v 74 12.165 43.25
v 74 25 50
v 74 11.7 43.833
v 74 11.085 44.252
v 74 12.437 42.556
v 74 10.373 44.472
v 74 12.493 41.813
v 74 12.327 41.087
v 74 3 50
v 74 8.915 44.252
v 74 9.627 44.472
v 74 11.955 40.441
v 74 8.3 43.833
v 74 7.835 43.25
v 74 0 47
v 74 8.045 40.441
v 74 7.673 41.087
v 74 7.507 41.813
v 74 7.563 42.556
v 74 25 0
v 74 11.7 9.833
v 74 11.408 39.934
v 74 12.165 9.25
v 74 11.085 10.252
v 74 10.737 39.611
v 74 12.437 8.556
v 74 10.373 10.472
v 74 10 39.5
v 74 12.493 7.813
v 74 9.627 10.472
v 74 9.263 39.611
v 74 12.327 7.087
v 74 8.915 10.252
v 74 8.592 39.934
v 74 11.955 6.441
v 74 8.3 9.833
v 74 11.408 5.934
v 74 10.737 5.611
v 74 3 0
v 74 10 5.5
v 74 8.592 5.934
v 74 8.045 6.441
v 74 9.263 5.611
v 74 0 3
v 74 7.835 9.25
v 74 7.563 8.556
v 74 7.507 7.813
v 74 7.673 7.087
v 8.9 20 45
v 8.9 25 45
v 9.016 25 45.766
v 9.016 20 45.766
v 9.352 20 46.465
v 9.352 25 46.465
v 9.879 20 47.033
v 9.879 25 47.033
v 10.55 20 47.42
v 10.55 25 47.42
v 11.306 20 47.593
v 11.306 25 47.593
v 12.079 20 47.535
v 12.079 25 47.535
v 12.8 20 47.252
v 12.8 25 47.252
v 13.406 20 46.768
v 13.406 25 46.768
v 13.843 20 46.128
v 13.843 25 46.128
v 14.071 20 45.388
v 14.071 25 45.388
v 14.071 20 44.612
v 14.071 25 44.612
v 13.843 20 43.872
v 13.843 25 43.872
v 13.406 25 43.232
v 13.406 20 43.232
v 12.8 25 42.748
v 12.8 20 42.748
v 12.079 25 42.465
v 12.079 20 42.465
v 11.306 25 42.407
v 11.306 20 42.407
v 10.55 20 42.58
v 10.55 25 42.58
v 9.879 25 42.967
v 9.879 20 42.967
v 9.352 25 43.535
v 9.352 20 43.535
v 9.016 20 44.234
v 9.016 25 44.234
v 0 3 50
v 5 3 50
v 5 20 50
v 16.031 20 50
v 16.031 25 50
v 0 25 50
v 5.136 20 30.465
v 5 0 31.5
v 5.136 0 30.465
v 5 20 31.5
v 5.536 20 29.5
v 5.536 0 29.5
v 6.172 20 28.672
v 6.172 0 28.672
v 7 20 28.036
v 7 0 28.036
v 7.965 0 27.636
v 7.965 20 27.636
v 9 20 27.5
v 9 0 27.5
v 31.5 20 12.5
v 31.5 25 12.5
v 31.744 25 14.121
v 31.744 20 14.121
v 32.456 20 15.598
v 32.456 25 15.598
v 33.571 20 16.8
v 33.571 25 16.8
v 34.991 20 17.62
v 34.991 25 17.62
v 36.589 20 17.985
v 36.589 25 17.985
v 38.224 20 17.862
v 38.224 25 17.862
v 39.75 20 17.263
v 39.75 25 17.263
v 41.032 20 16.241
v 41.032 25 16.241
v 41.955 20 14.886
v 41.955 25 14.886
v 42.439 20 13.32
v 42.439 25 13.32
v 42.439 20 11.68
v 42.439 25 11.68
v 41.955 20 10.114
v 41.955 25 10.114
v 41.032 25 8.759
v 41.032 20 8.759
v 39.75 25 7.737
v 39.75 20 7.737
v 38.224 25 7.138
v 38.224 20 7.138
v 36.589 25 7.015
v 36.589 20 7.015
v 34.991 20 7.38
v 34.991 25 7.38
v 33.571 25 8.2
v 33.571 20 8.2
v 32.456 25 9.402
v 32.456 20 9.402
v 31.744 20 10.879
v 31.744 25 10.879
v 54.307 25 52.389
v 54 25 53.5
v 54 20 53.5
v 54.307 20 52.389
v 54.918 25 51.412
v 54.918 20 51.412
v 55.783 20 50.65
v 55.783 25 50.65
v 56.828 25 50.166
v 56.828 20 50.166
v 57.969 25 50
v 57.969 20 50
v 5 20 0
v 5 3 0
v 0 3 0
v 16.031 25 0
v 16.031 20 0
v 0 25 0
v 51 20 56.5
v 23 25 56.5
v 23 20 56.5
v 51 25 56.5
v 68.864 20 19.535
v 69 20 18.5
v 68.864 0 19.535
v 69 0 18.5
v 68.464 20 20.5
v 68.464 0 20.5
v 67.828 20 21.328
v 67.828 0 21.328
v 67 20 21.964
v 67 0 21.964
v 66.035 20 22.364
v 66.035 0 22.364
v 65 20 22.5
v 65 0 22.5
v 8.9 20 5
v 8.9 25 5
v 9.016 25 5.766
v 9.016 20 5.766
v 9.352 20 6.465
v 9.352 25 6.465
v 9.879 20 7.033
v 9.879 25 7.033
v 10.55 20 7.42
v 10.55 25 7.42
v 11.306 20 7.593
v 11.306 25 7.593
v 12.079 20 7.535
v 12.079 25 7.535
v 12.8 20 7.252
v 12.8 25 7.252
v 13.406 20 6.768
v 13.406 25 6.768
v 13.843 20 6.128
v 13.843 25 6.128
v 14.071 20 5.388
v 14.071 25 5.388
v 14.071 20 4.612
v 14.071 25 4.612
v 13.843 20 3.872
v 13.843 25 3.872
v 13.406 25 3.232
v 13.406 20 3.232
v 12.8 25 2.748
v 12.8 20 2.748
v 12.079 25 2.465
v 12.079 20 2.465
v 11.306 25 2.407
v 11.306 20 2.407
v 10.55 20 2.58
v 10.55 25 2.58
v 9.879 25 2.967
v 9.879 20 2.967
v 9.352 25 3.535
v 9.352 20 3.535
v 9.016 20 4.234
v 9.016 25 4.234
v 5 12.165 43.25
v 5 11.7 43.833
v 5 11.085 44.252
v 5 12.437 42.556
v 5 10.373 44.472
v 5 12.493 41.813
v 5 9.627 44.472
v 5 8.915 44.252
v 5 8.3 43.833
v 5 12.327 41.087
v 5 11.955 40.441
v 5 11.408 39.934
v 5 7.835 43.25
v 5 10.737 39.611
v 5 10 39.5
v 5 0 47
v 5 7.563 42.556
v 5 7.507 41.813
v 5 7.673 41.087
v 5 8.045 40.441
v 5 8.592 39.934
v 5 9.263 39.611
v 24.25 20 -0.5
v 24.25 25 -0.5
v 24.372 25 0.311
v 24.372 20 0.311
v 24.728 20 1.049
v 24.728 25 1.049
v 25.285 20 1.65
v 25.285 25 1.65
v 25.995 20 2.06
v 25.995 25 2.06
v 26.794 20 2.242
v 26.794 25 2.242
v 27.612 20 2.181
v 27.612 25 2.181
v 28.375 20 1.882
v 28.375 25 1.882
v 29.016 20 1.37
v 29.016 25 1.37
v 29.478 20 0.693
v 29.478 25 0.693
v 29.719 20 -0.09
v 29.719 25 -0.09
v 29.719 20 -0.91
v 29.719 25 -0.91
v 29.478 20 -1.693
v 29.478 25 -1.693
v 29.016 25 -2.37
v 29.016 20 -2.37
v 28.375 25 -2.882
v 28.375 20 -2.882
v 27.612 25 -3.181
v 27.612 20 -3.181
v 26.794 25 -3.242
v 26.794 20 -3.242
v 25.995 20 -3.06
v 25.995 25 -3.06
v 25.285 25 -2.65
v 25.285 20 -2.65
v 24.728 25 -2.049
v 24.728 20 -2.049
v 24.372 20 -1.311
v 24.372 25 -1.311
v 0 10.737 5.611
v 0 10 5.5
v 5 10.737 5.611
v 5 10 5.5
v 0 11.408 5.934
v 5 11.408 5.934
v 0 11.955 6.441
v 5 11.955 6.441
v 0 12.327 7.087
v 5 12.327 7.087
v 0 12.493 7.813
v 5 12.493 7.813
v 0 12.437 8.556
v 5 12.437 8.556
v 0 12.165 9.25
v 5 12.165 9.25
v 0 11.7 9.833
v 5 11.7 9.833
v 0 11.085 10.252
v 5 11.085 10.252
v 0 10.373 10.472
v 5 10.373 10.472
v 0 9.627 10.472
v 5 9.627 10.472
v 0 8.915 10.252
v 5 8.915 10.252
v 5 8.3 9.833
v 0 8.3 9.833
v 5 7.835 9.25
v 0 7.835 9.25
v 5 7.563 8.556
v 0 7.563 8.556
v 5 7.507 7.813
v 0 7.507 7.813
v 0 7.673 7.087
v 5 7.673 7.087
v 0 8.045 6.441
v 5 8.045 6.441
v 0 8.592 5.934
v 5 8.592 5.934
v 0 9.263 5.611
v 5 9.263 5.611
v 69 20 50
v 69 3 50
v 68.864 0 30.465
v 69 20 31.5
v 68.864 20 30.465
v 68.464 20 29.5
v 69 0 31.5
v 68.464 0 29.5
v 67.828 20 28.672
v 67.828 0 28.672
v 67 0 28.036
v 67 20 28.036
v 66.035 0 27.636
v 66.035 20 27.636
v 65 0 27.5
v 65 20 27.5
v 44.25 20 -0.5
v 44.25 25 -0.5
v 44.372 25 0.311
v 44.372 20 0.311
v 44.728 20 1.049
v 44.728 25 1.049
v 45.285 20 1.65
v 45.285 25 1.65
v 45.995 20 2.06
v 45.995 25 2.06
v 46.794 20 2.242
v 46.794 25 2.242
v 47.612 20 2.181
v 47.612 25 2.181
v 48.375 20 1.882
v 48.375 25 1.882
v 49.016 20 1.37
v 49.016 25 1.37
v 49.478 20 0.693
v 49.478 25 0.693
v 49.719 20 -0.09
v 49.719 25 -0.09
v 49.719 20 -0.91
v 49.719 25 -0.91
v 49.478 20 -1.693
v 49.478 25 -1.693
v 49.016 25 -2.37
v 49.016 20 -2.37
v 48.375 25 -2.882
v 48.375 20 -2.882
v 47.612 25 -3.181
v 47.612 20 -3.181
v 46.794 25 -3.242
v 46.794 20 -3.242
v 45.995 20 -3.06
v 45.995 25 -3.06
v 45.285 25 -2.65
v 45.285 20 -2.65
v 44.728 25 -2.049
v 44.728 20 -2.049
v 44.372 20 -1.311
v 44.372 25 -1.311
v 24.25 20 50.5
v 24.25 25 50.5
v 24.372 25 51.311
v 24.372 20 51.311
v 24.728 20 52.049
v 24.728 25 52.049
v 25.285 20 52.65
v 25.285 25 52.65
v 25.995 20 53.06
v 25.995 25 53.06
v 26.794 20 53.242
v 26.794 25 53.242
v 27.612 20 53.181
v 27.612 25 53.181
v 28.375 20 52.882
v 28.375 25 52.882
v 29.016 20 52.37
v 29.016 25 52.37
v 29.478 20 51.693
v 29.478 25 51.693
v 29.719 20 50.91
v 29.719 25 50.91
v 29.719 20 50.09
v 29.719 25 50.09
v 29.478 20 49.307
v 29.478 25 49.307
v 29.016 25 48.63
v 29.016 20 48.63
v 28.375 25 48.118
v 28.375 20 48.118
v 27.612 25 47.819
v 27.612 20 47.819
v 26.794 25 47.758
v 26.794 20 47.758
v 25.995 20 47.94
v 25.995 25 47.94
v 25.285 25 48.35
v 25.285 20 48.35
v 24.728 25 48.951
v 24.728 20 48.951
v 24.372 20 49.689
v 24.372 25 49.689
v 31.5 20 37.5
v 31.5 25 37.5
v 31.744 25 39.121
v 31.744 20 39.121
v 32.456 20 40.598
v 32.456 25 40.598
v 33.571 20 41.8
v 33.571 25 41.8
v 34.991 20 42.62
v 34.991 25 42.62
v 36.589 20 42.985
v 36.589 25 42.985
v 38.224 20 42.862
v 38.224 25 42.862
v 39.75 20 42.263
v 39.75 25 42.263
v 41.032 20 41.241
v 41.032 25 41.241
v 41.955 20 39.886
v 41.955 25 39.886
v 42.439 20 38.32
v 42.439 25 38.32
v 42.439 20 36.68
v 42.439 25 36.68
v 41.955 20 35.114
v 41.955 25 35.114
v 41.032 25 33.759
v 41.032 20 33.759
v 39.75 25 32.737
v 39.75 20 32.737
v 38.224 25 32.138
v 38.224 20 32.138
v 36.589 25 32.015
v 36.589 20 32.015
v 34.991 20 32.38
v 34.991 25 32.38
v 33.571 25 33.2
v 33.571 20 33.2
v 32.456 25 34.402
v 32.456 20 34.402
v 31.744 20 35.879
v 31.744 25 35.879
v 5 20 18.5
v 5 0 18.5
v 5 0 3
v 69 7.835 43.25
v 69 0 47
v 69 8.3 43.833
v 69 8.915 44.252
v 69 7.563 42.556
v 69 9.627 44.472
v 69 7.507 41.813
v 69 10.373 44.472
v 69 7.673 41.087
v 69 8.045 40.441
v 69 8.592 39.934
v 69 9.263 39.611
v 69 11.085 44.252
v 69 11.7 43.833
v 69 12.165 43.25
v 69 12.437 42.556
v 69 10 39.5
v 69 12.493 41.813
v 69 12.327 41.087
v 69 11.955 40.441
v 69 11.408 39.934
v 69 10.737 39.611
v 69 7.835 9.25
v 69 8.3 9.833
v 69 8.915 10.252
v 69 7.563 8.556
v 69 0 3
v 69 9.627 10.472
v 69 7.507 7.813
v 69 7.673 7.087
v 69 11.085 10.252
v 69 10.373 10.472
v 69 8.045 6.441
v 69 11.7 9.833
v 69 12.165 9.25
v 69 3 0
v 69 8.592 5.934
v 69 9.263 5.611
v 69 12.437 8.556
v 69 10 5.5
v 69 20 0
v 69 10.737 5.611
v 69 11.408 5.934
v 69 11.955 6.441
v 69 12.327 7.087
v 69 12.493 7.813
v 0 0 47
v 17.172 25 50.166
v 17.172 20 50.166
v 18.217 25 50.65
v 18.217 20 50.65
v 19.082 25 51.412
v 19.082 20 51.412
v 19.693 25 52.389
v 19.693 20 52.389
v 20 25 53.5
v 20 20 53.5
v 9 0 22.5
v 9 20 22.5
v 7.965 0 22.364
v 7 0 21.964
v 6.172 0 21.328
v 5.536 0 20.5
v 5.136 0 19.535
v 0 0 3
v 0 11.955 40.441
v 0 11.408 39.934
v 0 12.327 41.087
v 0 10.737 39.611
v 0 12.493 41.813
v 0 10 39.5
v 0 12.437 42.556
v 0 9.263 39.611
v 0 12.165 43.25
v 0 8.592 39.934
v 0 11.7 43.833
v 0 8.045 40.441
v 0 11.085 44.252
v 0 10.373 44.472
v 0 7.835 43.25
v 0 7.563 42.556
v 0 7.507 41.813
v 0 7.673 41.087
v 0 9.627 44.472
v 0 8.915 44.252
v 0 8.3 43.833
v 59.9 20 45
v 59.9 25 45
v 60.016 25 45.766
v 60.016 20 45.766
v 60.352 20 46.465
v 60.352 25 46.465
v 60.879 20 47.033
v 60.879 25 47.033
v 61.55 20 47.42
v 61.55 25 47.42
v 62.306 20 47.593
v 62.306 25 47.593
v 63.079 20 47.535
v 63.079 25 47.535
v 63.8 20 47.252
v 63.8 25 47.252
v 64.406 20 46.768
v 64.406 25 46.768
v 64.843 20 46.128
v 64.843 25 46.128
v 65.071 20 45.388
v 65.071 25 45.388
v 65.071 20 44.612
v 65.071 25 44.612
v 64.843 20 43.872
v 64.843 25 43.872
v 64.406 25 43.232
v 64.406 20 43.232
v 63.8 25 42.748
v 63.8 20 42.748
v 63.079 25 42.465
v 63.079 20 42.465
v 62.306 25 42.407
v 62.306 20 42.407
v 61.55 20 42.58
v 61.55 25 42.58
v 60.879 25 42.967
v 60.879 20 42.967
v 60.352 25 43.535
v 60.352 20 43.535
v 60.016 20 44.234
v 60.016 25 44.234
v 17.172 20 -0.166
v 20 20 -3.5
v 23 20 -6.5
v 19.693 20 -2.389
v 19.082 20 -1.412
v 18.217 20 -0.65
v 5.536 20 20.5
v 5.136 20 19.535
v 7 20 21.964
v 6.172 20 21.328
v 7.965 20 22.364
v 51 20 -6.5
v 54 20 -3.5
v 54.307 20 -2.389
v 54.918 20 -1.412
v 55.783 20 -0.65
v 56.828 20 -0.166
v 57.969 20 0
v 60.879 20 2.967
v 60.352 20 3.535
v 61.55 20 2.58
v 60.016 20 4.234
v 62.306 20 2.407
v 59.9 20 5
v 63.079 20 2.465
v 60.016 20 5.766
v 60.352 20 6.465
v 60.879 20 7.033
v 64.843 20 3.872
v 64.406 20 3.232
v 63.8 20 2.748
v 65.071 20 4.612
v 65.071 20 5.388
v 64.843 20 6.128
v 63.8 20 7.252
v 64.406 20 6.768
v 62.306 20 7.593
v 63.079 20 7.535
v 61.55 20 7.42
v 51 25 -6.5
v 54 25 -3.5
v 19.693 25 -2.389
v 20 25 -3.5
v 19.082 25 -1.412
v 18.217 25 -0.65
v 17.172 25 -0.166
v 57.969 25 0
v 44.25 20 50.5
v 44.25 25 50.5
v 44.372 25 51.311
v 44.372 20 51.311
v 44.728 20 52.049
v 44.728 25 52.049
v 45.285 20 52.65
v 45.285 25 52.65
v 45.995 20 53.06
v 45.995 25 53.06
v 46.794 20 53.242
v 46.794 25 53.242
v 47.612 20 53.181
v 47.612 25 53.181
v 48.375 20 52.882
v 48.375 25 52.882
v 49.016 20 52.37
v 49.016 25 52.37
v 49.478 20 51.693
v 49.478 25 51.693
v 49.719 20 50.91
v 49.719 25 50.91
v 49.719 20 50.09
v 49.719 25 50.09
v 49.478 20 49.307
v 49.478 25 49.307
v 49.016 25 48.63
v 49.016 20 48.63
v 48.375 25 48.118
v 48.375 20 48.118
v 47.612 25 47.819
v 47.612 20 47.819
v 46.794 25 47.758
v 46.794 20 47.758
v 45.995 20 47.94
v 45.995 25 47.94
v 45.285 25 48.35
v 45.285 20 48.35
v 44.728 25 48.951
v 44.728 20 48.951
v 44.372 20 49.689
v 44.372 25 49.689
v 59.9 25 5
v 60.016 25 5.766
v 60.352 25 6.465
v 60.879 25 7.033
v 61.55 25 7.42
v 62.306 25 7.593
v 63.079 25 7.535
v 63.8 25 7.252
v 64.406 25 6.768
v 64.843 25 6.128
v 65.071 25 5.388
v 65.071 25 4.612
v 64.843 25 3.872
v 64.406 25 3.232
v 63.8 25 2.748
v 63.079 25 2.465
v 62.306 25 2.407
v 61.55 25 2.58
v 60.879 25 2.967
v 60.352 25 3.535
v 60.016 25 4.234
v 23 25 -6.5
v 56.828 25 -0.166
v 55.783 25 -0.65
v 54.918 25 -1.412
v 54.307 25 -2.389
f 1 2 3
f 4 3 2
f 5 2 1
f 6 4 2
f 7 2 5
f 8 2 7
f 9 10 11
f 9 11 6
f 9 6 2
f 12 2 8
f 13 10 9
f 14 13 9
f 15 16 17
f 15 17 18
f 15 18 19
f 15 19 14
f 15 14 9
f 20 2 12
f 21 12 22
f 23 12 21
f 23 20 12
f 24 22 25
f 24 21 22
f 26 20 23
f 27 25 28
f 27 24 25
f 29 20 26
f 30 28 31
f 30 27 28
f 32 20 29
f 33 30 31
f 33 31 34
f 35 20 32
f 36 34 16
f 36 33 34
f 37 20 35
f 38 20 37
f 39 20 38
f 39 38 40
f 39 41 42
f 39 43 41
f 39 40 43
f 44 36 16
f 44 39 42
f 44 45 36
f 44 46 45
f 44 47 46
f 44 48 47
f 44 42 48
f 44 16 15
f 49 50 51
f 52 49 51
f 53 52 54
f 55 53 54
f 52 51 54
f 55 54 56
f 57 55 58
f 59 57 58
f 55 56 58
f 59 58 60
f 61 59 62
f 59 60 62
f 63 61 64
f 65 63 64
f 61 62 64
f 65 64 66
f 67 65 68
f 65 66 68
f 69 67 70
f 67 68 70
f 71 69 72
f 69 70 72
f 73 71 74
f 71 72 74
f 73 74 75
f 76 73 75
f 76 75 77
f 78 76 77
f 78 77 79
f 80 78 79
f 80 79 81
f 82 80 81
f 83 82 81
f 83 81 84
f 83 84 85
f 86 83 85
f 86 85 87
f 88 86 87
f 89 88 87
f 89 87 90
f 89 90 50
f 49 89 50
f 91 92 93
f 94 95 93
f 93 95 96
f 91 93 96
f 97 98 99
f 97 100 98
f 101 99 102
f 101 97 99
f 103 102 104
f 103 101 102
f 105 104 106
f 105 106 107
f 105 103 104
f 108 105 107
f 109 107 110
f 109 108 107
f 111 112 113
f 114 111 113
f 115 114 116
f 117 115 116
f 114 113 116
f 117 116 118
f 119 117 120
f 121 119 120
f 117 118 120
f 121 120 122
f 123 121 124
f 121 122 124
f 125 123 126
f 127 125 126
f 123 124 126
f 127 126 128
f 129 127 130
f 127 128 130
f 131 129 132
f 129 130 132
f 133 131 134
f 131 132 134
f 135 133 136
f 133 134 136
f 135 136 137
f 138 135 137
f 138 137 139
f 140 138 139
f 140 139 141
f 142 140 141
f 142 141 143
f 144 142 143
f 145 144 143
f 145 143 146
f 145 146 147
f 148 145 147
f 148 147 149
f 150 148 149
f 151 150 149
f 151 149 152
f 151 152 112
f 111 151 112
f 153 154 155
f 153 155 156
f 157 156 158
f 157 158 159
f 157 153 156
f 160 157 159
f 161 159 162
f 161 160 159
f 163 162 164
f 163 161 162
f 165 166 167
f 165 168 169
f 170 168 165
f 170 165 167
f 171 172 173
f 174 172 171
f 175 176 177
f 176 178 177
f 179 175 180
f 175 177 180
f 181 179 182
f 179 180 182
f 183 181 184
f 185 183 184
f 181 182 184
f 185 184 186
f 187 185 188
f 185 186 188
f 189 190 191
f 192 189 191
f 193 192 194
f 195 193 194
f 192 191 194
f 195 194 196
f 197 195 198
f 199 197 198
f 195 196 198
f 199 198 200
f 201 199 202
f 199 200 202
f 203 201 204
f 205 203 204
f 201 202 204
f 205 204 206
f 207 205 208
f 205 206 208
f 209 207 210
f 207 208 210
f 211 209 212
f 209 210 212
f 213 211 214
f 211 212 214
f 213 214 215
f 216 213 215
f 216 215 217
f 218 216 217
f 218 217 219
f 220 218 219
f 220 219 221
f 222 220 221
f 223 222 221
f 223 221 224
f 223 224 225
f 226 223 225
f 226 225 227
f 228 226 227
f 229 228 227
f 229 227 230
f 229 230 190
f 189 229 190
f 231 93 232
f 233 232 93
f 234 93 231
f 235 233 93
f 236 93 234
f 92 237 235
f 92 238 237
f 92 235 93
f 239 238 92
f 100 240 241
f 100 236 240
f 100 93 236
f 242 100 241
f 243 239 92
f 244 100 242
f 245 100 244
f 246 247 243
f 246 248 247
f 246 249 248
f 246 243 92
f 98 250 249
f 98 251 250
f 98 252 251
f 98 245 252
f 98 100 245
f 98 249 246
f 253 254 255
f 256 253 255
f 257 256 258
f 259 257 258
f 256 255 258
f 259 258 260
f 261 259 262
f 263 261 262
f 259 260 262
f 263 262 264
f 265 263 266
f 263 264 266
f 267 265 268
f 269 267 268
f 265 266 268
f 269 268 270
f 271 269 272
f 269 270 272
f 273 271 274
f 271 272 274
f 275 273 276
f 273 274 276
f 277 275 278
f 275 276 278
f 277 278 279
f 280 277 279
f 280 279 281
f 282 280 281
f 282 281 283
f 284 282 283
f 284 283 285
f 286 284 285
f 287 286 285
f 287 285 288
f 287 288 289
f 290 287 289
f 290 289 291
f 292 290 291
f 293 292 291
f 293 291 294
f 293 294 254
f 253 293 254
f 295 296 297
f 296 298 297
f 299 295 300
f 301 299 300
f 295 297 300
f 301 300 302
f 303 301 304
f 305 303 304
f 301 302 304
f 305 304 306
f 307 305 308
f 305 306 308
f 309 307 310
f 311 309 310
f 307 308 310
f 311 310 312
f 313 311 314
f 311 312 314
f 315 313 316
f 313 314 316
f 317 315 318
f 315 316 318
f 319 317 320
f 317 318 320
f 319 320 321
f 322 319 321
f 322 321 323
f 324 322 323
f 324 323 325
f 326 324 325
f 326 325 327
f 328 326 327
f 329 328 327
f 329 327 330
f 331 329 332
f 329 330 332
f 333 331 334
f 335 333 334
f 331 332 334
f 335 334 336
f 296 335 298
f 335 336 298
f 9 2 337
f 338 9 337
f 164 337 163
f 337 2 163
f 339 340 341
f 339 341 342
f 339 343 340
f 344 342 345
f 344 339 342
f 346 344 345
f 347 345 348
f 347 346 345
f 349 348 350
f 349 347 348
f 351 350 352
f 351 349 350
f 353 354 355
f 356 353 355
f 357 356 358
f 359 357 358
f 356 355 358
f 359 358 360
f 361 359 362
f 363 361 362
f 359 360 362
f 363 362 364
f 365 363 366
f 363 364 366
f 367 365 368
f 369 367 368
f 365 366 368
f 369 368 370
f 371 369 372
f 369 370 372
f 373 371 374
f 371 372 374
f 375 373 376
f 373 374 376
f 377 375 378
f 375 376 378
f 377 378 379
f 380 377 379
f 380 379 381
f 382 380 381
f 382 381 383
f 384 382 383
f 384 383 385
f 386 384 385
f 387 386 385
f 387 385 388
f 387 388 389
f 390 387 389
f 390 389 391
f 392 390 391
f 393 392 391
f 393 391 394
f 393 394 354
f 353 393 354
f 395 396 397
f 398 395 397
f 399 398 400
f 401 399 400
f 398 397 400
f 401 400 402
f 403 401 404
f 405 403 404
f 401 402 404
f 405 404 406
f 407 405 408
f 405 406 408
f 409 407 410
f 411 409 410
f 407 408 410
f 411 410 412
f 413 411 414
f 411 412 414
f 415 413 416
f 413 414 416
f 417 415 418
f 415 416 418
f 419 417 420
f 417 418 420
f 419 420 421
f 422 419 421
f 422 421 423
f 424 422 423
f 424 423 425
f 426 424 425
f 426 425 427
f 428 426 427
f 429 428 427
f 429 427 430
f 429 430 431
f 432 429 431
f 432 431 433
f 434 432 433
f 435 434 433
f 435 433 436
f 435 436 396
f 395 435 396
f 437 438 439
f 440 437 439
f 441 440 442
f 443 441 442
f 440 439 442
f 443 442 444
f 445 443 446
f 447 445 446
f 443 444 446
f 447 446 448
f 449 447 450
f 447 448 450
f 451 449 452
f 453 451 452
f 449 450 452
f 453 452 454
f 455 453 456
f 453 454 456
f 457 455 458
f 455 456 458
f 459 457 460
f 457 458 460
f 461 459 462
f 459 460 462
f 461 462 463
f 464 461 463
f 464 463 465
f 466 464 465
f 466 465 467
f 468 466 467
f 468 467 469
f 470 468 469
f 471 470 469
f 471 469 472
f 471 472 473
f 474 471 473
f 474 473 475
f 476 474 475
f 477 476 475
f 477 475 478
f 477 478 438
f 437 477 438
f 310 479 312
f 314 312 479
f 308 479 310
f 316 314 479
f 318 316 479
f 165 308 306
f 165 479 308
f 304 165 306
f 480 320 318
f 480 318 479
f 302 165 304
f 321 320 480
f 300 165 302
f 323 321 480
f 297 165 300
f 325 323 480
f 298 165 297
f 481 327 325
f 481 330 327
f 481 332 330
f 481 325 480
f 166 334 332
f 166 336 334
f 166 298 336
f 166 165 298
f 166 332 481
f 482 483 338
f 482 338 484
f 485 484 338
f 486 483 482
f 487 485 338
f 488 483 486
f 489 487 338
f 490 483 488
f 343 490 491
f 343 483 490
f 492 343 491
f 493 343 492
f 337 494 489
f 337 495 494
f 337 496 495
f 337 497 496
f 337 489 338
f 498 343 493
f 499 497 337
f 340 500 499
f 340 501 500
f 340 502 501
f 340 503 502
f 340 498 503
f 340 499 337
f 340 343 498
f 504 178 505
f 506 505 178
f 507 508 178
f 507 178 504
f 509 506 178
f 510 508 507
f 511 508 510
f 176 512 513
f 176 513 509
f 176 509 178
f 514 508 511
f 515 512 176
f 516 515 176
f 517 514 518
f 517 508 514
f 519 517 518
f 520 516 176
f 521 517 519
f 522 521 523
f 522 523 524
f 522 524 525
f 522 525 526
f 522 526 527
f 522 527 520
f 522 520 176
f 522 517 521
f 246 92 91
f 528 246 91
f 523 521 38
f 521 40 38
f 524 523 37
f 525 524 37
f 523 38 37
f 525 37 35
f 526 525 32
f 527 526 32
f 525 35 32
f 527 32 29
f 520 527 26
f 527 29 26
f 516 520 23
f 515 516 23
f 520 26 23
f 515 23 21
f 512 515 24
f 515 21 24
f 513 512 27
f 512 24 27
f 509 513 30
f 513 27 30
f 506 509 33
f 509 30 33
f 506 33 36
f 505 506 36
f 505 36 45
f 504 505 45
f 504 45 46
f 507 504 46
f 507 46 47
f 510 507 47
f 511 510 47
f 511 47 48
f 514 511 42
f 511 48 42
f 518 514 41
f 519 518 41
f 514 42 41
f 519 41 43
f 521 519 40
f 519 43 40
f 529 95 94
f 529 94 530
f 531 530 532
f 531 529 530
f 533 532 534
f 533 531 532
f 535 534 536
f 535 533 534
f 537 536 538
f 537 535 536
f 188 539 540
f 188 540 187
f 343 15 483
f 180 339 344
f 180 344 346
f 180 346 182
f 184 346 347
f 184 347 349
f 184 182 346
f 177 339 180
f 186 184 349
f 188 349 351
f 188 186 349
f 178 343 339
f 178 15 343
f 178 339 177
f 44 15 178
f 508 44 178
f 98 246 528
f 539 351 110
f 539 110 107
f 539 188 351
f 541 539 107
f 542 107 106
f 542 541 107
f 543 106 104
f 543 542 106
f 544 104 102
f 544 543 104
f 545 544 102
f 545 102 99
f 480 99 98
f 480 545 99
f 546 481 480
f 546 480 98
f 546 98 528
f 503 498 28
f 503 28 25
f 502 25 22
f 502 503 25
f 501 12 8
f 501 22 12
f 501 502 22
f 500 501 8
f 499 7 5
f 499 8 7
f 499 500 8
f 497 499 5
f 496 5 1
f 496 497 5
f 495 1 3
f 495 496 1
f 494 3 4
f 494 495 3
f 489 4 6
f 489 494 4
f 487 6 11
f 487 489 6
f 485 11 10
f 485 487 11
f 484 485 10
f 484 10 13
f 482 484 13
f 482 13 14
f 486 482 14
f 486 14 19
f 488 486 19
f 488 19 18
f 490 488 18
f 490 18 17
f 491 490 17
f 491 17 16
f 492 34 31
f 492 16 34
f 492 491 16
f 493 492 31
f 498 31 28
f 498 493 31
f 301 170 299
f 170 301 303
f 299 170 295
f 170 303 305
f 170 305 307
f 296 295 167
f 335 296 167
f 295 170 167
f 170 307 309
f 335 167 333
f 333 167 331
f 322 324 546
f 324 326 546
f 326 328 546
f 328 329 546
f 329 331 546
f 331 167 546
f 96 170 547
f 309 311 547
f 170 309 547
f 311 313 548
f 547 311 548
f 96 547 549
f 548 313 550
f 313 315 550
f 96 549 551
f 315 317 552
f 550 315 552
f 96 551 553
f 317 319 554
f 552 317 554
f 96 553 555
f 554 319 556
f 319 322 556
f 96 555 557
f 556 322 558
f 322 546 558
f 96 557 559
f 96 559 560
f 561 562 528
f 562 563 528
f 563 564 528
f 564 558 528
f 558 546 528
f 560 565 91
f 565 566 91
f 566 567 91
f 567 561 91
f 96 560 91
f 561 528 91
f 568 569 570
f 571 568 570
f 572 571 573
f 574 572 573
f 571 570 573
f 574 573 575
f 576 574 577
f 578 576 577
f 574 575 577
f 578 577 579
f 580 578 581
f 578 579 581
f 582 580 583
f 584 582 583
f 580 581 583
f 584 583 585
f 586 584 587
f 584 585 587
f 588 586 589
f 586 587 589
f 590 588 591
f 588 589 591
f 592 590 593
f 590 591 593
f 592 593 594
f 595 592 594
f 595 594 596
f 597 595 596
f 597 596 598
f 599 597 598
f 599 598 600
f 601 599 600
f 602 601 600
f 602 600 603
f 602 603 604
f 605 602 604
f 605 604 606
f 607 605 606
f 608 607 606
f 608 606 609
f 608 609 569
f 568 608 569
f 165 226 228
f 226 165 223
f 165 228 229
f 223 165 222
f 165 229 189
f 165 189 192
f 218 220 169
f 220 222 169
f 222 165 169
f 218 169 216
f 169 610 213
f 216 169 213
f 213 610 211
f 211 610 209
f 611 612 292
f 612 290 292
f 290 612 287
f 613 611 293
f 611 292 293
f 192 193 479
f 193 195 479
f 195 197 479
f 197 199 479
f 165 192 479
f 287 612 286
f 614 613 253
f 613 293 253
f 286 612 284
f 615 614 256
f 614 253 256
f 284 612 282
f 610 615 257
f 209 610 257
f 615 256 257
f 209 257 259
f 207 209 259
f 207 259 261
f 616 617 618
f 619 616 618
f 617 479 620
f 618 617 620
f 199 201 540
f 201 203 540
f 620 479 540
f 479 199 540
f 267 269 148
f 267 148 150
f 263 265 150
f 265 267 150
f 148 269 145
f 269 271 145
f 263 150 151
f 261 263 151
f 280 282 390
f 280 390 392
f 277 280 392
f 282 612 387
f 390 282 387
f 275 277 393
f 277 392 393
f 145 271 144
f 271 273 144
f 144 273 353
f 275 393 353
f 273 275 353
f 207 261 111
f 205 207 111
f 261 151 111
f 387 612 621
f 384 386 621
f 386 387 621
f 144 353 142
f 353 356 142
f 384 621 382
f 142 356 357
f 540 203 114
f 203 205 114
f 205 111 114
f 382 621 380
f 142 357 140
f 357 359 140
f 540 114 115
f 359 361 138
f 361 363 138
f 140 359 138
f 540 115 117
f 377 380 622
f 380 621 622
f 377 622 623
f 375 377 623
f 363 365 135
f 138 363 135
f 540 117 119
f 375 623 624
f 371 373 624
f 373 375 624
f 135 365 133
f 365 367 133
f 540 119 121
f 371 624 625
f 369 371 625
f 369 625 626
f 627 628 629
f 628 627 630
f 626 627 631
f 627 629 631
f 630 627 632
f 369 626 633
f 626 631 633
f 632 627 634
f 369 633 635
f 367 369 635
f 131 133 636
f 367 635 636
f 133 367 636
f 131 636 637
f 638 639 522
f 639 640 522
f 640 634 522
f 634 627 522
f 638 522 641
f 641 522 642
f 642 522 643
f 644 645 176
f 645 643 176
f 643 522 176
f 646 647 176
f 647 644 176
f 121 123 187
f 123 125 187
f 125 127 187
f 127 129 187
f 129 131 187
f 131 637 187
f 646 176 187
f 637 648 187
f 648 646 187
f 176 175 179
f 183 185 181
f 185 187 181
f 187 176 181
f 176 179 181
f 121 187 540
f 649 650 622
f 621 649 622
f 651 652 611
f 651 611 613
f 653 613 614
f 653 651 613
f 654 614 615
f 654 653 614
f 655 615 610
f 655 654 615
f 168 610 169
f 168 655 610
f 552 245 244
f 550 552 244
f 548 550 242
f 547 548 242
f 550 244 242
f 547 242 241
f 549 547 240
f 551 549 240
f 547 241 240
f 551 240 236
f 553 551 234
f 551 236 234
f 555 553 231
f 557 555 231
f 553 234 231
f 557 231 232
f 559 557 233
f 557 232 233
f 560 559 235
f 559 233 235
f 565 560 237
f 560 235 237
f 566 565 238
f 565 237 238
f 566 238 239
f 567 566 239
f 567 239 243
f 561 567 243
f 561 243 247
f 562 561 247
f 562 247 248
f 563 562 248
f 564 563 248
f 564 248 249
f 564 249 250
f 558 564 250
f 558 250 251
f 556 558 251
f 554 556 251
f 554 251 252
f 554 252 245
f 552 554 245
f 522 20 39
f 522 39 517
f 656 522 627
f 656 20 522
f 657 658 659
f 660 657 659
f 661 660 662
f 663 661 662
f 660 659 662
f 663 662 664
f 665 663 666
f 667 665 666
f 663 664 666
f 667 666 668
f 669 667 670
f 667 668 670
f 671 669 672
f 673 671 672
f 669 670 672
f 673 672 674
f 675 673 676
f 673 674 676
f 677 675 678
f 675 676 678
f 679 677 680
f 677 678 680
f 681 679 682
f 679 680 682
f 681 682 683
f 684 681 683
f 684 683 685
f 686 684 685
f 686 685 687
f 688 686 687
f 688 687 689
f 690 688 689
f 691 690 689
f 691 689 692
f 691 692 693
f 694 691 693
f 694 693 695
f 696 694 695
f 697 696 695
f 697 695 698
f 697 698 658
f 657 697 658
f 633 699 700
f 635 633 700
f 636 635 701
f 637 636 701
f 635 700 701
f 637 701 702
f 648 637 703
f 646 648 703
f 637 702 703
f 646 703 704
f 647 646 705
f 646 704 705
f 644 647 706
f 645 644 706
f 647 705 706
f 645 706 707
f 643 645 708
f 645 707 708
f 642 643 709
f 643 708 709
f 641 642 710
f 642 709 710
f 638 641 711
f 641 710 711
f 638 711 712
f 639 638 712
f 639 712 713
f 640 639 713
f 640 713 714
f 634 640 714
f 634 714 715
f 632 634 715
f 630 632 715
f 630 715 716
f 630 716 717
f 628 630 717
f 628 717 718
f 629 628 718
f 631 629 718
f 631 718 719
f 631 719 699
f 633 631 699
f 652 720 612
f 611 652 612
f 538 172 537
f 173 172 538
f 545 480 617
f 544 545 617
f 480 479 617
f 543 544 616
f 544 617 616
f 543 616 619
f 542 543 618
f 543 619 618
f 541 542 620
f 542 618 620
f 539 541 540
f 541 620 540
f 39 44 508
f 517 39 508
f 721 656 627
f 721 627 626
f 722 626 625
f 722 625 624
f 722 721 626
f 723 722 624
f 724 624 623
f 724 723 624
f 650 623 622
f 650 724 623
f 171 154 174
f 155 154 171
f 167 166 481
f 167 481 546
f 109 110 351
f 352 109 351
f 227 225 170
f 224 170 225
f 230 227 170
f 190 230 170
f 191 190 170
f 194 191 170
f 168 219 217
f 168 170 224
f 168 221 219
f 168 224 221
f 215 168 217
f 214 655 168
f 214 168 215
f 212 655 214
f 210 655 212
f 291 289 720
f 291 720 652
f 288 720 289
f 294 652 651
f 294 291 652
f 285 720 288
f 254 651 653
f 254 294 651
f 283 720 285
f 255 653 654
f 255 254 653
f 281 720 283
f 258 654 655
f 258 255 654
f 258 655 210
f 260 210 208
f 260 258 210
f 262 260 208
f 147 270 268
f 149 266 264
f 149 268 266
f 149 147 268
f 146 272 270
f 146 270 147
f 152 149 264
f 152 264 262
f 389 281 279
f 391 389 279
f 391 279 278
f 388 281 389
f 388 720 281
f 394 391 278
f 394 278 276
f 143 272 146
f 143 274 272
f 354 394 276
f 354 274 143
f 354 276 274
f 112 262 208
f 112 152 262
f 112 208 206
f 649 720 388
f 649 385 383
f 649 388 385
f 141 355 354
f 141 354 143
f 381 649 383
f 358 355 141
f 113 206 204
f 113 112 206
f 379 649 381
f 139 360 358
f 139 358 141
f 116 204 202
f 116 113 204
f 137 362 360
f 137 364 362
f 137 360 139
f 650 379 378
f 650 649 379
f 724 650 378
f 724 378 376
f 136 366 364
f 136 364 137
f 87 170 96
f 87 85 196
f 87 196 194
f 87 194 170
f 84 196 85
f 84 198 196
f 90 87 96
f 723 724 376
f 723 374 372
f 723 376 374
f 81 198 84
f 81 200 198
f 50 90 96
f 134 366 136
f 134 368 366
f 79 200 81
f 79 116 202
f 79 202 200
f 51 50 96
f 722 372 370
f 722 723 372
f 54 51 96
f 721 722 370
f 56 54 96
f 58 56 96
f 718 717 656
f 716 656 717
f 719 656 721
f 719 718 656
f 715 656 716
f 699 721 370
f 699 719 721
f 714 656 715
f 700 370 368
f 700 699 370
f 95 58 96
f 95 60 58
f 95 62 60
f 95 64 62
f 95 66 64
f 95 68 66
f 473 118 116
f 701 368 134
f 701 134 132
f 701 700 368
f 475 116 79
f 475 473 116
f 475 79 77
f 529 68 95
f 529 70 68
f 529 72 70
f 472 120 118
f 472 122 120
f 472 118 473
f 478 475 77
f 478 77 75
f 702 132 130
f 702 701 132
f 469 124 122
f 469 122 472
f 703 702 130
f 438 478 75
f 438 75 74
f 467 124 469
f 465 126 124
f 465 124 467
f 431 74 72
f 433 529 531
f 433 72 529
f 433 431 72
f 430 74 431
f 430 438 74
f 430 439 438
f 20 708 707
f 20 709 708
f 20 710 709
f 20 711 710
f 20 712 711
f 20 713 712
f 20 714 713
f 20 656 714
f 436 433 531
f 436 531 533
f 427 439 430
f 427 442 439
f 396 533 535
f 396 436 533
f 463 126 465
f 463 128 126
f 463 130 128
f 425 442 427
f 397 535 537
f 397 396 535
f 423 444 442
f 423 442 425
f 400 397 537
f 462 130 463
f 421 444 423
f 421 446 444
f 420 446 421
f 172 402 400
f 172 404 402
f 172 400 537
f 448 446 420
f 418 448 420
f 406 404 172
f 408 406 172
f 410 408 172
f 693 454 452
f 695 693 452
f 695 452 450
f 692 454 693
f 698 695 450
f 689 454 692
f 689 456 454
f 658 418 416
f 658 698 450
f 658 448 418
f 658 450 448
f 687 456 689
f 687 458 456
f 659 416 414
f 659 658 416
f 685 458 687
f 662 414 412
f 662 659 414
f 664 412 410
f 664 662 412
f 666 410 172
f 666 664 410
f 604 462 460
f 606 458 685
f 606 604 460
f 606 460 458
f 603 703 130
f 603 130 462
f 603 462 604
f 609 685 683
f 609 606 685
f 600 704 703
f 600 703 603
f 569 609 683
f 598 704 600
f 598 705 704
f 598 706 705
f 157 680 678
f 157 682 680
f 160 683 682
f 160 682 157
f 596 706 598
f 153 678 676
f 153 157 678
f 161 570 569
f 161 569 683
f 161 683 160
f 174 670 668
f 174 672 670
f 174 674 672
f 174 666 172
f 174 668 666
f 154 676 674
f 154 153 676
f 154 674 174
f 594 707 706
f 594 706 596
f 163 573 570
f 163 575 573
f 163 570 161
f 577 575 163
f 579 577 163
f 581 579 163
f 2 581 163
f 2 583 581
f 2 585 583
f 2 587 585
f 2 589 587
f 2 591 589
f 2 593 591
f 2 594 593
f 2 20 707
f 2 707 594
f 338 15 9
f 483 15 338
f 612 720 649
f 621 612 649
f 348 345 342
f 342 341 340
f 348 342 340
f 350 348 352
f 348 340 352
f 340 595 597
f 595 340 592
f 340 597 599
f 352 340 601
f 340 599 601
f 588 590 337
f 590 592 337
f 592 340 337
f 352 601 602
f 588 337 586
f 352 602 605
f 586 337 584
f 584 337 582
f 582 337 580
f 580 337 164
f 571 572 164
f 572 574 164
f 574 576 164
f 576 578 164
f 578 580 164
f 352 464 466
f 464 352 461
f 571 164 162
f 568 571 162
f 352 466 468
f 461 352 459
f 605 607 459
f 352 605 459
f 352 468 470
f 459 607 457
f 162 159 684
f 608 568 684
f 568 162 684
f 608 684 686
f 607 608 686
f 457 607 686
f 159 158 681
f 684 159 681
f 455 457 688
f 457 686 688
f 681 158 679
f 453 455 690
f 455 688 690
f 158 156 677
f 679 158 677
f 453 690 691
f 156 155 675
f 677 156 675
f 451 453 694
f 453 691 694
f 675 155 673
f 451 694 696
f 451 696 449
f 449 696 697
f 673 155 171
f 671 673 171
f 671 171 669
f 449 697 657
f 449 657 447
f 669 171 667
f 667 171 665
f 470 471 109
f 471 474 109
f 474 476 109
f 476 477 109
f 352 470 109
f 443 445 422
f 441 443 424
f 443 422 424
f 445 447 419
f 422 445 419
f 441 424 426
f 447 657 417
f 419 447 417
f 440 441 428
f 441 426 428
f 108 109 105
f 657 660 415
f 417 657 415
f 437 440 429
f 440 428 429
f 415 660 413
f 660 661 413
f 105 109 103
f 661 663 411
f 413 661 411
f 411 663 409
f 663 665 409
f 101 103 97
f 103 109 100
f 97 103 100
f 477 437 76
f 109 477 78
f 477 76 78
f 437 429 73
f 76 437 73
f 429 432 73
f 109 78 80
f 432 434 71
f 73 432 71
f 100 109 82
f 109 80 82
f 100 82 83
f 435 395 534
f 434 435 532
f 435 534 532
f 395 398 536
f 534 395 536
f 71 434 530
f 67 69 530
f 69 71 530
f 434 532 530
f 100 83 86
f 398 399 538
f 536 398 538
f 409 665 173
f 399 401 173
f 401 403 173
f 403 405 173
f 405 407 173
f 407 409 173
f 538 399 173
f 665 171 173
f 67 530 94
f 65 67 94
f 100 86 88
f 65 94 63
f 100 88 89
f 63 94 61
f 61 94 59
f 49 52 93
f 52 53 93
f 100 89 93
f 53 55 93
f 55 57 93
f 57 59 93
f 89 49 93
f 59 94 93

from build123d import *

# Parameters (mm, degrees)
BOSS_EXTRUDE1_DEPTH = 50
SKETCH2_R           = 2.5
CUT_EXTRUDE1_DEPTH  = 100
CHAMFER1_SIZE       = 3
SKETCH3_R           = 2.6
CUT_EXTRUDE2_DEPTH  = 93.741576437
SKETCH6_R           = 5.5
CUT_EXTRUDE3_DEPTH  = 93.741576437
SKETCH7_W           = 74
SKETCH7_H           = 5
BOSS_EXTRUDE2_DEPTH = 20
FILLET1_R           = 4
SKETCH8_W           = 34
SKETCH8_H           = 6.5
BOSS_EXTRUDE3_DEPTH = 5
SKETCH9_R           = 2.75
CUT_EXTRUDE4_DEPTH  = 97.401504138
CHAMFER2_SIZE       = 3
FILLET2_R           = 4


with BuildPart() as part:
    # Sketch1 → Boss-Extrude1 (new body)
    with BuildSketch(Plane.XY):
        Polygon((0, 0), (0, 25), (74, 25), (74, 0), (69, 0), (69, 20), (5, 20), (5, 0), align=None)
    extrude(amount=BOSS_EXTRUDE1_DEPTH)

    # Sketch2 → Cut-Extrude1 (cut, symmetric)
    with BuildSketch(Plane(origin=(5, 0, 0), x_dir=(0, 0, -1), z_dir=(1, 0, 0))):
        with Locations((-42, 10)):
            Circle(SKETCH2_R)
        with Locations((-8, 10)):
            Circle(SKETCH2_R)
    extrude(amount=CUT_EXTRUDE1_DEPTH, both=True, mode=Mode.SUBTRACT)

    # Chamfer1
    chamfer1_edges = [part.edges().sort_by_distance(p)[0] for p in [
        (2.5, 0, 0),
        (71.5, 0, 50),
        (2.5, 0, 50),
        (71.5, 0, 0),
    ]]
    chamfer(chamfer1_edges, length=CHAMFER1_SIZE)

    # Sketch3 → Cut-Extrude2 (cut, through all)
    with BuildSketch(Plane(origin=(0, 25, 0), x_dir=(1, 0, 0), z_dir=(0, 1, 0))):
        with Locations(Location((11.5, -45, 0), (0, 0, 180))):
            Circle(SKETCH3_R)
        with Locations(Location((62.5, -45, 0), (0, 0, 180))):
            Circle(SKETCH3_R)
        with Locations(Location((62.5, -5, 0), (0, 0, 180))):
            Circle(SKETCH3_R)
        with Locations(Location((11.5, -5, 0), (0, 0, 180))):
            Circle(SKETCH3_R)
    extrude(amount=-CUT_EXTRUDE2_DEPTH, mode=Mode.SUBTRACT)

    # Sketch6 → Cut-Extrude3 (cut, through all)
    with BuildSketch(Plane(origin=(0, 25, 0), x_dir=(1, 0, 0), z_dir=(0, 1, 0))):
        with Locations(Location((37, -37.5, 0), (0, 0, 180))):
            Circle(SKETCH6_R)
        with Locations(Location((37, -12.5, 0), (0, 0, 180))):
            Circle(SKETCH6_R)
    extrude(amount=-CUT_EXTRUDE3_DEPTH, mode=Mode.SUBTRACT)

    # Sketch7 → Boss-Extrude2 (add)
    with BuildSketch(Plane.XZ):
        with Locations((37, 25)):
            Rectangle(SKETCH7_W, SKETCH7_H)
    extrude(amount=-BOSS_EXTRUDE2_DEPTH)

    # Fillet1
    fillet1_edges = [part.edges().sort_by_distance(p)[0] for p in [
        (5, 10, 22.5),
        (5, 10, 27.5),
        (69, 10, 22.5),
        (69, 10, 27.5),
    ]]
    fillet(fillet1_edges, radius=FILLET1_R)

    # Sketch8 → Boss-Extrude3 (add)
    with BuildSketch(Plane(origin=(0, 25, 0), x_dir=(1, 0, 0), z_dir=(0, 1, 0))):
        with Locations((37, 3.25)):
            Rectangle(SKETCH8_W, SKETCH8_H)
    boss_extrude3 = extrude(amount=-BOSS_EXTRUDE3_DEPTH)

    # Mirror1: Boss-Extrude3 across plane
    add(boss_extrude3.mirror(Plane.XY.offset(25)))

    # Sketch9 → Cut-Extrude4 (cut, through all)
    with BuildSketch(Plane(origin=(0, 25, 0), x_dir=(1, 0, 0), z_dir=(0, 1, 0))):
        with Locations(Location((27, 0.5, 0), (0, 0, 180))):
            Circle(SKETCH9_R)
        with Locations(Location((47, 0.5, 0), (0, 0, 180))):
            Circle(SKETCH9_R)
        with Locations(Location((27, -50.5, 0), (0, 0, 180))):
            Circle(SKETCH9_R)
        with Locations(Location((47, -50.5, 0), (0, 0, 180))):
            Circle(SKETCH9_R)
    extrude(amount=-CUT_EXTRUDE4_DEPTH, mode=Mode.SUBTRACT)

    # Chamfer2
    chamfer2_edges = [part.edges().sort_by_distance(p)[0] for p in [
        (20, 22.5, -6.5),
        (54, 22.5, -6.5),
        (20, 22.5, 56.5),
        (54, 22.5, 56.5),
    ]]
    chamfer(chamfer2_edges, length=CHAMFER2_SIZE)

    # Fillet2
    # the kernel refuses this fillet: 4 mm, written as the material it adds along each edge
    with BuildSketch(Plane(origin=(20, 25, 50), x_dir=(-1, 0, 0), z_dir=(0, -1, 0))) as fillet2_piece_1:
        with BuildLine():
            CenterArc((3.968626967, -4), FILLET2_R, 90, 82.819244219)
            Line((0, -3.5), (-0.079372539, -3.49))
            ThreePointArc((-0.079372539, -3.49), (-0.08, -1.75), (-0.08, 0))
            Line((-0.08, 0), (0, 0.08))
            Line((0, 0.08), (3.968626967, 0.08))
            Line((3.968626967, 0.08), (3.968626967, 0))
        make_face()
    extrude(amount=5)
    with BuildSketch(Plane(origin=(54, 25, 50), x_dir=(1, 0, 0), z_dir=(0, -1, 0))) as fillet2_piece_2:
        with BuildLine():
            CenterArc((3.968626967, 4), FILLET2_R, 187.180755781, 82.819244219)
            Line((0, 3.5), (-0.079372539, 3.49))
            ThreePointArc((-0.079372539, 3.49), (-0.08, 1.75), (-0.08, 0))
            Line((-0.08, 0), (0, -0.08))
            Line((0, -0.08), (3.968626967, -0.08))
            Line((3.968626967, -0.08), (3.968626967, 0))
        make_face()
    extrude(amount=5)
    with BuildSketch(Plane(origin=(54, 25, 0), x_dir=(0, 0, -1), z_dir=(0, -1, 0))) as fillet2_piece_3:
        with BuildLine():
            CenterArc((4, 3.968626967), FILLET2_R, 180, 82.819244219)
            Line((0, 3.968626967), (-0.08, 3.968626967))
            Line((-0.08, 3.968626967), (-0.08, 0))
            Line((-0.08, 0), (0, -0.08))
            ThreePointArc((0, -0.08), (1.75, -0.08), (3.49, -0.079372539))
            Line((3.49, -0.079372539), (3.5, 0))
        make_face()
    extrude(amount=5)
    with BuildSketch(Plane(origin=(20, 25, 0), x_dir=(0, 0, -1), z_dir=(0, -1, 0))) as fillet2_piece_4:
        with BuildLine():
            CenterArc((4, -3.968626967), FILLET2_R, 97.180755781, 82.819244219)
            Line((0, -3.968626967), (-0.08, -3.968626967))
            Line((-0.08, -3.968626967), (-0.08, 0))
            Line((-0.08, 0), (0, 0.08))
            ThreePointArc((0, 0.08), (1.75, 0.08), (3.49, 0.079372539))
            Line((3.49, 0.079372539), (3.5, 0))
        make_face()
    extrude(amount=5)


solid = part.part
